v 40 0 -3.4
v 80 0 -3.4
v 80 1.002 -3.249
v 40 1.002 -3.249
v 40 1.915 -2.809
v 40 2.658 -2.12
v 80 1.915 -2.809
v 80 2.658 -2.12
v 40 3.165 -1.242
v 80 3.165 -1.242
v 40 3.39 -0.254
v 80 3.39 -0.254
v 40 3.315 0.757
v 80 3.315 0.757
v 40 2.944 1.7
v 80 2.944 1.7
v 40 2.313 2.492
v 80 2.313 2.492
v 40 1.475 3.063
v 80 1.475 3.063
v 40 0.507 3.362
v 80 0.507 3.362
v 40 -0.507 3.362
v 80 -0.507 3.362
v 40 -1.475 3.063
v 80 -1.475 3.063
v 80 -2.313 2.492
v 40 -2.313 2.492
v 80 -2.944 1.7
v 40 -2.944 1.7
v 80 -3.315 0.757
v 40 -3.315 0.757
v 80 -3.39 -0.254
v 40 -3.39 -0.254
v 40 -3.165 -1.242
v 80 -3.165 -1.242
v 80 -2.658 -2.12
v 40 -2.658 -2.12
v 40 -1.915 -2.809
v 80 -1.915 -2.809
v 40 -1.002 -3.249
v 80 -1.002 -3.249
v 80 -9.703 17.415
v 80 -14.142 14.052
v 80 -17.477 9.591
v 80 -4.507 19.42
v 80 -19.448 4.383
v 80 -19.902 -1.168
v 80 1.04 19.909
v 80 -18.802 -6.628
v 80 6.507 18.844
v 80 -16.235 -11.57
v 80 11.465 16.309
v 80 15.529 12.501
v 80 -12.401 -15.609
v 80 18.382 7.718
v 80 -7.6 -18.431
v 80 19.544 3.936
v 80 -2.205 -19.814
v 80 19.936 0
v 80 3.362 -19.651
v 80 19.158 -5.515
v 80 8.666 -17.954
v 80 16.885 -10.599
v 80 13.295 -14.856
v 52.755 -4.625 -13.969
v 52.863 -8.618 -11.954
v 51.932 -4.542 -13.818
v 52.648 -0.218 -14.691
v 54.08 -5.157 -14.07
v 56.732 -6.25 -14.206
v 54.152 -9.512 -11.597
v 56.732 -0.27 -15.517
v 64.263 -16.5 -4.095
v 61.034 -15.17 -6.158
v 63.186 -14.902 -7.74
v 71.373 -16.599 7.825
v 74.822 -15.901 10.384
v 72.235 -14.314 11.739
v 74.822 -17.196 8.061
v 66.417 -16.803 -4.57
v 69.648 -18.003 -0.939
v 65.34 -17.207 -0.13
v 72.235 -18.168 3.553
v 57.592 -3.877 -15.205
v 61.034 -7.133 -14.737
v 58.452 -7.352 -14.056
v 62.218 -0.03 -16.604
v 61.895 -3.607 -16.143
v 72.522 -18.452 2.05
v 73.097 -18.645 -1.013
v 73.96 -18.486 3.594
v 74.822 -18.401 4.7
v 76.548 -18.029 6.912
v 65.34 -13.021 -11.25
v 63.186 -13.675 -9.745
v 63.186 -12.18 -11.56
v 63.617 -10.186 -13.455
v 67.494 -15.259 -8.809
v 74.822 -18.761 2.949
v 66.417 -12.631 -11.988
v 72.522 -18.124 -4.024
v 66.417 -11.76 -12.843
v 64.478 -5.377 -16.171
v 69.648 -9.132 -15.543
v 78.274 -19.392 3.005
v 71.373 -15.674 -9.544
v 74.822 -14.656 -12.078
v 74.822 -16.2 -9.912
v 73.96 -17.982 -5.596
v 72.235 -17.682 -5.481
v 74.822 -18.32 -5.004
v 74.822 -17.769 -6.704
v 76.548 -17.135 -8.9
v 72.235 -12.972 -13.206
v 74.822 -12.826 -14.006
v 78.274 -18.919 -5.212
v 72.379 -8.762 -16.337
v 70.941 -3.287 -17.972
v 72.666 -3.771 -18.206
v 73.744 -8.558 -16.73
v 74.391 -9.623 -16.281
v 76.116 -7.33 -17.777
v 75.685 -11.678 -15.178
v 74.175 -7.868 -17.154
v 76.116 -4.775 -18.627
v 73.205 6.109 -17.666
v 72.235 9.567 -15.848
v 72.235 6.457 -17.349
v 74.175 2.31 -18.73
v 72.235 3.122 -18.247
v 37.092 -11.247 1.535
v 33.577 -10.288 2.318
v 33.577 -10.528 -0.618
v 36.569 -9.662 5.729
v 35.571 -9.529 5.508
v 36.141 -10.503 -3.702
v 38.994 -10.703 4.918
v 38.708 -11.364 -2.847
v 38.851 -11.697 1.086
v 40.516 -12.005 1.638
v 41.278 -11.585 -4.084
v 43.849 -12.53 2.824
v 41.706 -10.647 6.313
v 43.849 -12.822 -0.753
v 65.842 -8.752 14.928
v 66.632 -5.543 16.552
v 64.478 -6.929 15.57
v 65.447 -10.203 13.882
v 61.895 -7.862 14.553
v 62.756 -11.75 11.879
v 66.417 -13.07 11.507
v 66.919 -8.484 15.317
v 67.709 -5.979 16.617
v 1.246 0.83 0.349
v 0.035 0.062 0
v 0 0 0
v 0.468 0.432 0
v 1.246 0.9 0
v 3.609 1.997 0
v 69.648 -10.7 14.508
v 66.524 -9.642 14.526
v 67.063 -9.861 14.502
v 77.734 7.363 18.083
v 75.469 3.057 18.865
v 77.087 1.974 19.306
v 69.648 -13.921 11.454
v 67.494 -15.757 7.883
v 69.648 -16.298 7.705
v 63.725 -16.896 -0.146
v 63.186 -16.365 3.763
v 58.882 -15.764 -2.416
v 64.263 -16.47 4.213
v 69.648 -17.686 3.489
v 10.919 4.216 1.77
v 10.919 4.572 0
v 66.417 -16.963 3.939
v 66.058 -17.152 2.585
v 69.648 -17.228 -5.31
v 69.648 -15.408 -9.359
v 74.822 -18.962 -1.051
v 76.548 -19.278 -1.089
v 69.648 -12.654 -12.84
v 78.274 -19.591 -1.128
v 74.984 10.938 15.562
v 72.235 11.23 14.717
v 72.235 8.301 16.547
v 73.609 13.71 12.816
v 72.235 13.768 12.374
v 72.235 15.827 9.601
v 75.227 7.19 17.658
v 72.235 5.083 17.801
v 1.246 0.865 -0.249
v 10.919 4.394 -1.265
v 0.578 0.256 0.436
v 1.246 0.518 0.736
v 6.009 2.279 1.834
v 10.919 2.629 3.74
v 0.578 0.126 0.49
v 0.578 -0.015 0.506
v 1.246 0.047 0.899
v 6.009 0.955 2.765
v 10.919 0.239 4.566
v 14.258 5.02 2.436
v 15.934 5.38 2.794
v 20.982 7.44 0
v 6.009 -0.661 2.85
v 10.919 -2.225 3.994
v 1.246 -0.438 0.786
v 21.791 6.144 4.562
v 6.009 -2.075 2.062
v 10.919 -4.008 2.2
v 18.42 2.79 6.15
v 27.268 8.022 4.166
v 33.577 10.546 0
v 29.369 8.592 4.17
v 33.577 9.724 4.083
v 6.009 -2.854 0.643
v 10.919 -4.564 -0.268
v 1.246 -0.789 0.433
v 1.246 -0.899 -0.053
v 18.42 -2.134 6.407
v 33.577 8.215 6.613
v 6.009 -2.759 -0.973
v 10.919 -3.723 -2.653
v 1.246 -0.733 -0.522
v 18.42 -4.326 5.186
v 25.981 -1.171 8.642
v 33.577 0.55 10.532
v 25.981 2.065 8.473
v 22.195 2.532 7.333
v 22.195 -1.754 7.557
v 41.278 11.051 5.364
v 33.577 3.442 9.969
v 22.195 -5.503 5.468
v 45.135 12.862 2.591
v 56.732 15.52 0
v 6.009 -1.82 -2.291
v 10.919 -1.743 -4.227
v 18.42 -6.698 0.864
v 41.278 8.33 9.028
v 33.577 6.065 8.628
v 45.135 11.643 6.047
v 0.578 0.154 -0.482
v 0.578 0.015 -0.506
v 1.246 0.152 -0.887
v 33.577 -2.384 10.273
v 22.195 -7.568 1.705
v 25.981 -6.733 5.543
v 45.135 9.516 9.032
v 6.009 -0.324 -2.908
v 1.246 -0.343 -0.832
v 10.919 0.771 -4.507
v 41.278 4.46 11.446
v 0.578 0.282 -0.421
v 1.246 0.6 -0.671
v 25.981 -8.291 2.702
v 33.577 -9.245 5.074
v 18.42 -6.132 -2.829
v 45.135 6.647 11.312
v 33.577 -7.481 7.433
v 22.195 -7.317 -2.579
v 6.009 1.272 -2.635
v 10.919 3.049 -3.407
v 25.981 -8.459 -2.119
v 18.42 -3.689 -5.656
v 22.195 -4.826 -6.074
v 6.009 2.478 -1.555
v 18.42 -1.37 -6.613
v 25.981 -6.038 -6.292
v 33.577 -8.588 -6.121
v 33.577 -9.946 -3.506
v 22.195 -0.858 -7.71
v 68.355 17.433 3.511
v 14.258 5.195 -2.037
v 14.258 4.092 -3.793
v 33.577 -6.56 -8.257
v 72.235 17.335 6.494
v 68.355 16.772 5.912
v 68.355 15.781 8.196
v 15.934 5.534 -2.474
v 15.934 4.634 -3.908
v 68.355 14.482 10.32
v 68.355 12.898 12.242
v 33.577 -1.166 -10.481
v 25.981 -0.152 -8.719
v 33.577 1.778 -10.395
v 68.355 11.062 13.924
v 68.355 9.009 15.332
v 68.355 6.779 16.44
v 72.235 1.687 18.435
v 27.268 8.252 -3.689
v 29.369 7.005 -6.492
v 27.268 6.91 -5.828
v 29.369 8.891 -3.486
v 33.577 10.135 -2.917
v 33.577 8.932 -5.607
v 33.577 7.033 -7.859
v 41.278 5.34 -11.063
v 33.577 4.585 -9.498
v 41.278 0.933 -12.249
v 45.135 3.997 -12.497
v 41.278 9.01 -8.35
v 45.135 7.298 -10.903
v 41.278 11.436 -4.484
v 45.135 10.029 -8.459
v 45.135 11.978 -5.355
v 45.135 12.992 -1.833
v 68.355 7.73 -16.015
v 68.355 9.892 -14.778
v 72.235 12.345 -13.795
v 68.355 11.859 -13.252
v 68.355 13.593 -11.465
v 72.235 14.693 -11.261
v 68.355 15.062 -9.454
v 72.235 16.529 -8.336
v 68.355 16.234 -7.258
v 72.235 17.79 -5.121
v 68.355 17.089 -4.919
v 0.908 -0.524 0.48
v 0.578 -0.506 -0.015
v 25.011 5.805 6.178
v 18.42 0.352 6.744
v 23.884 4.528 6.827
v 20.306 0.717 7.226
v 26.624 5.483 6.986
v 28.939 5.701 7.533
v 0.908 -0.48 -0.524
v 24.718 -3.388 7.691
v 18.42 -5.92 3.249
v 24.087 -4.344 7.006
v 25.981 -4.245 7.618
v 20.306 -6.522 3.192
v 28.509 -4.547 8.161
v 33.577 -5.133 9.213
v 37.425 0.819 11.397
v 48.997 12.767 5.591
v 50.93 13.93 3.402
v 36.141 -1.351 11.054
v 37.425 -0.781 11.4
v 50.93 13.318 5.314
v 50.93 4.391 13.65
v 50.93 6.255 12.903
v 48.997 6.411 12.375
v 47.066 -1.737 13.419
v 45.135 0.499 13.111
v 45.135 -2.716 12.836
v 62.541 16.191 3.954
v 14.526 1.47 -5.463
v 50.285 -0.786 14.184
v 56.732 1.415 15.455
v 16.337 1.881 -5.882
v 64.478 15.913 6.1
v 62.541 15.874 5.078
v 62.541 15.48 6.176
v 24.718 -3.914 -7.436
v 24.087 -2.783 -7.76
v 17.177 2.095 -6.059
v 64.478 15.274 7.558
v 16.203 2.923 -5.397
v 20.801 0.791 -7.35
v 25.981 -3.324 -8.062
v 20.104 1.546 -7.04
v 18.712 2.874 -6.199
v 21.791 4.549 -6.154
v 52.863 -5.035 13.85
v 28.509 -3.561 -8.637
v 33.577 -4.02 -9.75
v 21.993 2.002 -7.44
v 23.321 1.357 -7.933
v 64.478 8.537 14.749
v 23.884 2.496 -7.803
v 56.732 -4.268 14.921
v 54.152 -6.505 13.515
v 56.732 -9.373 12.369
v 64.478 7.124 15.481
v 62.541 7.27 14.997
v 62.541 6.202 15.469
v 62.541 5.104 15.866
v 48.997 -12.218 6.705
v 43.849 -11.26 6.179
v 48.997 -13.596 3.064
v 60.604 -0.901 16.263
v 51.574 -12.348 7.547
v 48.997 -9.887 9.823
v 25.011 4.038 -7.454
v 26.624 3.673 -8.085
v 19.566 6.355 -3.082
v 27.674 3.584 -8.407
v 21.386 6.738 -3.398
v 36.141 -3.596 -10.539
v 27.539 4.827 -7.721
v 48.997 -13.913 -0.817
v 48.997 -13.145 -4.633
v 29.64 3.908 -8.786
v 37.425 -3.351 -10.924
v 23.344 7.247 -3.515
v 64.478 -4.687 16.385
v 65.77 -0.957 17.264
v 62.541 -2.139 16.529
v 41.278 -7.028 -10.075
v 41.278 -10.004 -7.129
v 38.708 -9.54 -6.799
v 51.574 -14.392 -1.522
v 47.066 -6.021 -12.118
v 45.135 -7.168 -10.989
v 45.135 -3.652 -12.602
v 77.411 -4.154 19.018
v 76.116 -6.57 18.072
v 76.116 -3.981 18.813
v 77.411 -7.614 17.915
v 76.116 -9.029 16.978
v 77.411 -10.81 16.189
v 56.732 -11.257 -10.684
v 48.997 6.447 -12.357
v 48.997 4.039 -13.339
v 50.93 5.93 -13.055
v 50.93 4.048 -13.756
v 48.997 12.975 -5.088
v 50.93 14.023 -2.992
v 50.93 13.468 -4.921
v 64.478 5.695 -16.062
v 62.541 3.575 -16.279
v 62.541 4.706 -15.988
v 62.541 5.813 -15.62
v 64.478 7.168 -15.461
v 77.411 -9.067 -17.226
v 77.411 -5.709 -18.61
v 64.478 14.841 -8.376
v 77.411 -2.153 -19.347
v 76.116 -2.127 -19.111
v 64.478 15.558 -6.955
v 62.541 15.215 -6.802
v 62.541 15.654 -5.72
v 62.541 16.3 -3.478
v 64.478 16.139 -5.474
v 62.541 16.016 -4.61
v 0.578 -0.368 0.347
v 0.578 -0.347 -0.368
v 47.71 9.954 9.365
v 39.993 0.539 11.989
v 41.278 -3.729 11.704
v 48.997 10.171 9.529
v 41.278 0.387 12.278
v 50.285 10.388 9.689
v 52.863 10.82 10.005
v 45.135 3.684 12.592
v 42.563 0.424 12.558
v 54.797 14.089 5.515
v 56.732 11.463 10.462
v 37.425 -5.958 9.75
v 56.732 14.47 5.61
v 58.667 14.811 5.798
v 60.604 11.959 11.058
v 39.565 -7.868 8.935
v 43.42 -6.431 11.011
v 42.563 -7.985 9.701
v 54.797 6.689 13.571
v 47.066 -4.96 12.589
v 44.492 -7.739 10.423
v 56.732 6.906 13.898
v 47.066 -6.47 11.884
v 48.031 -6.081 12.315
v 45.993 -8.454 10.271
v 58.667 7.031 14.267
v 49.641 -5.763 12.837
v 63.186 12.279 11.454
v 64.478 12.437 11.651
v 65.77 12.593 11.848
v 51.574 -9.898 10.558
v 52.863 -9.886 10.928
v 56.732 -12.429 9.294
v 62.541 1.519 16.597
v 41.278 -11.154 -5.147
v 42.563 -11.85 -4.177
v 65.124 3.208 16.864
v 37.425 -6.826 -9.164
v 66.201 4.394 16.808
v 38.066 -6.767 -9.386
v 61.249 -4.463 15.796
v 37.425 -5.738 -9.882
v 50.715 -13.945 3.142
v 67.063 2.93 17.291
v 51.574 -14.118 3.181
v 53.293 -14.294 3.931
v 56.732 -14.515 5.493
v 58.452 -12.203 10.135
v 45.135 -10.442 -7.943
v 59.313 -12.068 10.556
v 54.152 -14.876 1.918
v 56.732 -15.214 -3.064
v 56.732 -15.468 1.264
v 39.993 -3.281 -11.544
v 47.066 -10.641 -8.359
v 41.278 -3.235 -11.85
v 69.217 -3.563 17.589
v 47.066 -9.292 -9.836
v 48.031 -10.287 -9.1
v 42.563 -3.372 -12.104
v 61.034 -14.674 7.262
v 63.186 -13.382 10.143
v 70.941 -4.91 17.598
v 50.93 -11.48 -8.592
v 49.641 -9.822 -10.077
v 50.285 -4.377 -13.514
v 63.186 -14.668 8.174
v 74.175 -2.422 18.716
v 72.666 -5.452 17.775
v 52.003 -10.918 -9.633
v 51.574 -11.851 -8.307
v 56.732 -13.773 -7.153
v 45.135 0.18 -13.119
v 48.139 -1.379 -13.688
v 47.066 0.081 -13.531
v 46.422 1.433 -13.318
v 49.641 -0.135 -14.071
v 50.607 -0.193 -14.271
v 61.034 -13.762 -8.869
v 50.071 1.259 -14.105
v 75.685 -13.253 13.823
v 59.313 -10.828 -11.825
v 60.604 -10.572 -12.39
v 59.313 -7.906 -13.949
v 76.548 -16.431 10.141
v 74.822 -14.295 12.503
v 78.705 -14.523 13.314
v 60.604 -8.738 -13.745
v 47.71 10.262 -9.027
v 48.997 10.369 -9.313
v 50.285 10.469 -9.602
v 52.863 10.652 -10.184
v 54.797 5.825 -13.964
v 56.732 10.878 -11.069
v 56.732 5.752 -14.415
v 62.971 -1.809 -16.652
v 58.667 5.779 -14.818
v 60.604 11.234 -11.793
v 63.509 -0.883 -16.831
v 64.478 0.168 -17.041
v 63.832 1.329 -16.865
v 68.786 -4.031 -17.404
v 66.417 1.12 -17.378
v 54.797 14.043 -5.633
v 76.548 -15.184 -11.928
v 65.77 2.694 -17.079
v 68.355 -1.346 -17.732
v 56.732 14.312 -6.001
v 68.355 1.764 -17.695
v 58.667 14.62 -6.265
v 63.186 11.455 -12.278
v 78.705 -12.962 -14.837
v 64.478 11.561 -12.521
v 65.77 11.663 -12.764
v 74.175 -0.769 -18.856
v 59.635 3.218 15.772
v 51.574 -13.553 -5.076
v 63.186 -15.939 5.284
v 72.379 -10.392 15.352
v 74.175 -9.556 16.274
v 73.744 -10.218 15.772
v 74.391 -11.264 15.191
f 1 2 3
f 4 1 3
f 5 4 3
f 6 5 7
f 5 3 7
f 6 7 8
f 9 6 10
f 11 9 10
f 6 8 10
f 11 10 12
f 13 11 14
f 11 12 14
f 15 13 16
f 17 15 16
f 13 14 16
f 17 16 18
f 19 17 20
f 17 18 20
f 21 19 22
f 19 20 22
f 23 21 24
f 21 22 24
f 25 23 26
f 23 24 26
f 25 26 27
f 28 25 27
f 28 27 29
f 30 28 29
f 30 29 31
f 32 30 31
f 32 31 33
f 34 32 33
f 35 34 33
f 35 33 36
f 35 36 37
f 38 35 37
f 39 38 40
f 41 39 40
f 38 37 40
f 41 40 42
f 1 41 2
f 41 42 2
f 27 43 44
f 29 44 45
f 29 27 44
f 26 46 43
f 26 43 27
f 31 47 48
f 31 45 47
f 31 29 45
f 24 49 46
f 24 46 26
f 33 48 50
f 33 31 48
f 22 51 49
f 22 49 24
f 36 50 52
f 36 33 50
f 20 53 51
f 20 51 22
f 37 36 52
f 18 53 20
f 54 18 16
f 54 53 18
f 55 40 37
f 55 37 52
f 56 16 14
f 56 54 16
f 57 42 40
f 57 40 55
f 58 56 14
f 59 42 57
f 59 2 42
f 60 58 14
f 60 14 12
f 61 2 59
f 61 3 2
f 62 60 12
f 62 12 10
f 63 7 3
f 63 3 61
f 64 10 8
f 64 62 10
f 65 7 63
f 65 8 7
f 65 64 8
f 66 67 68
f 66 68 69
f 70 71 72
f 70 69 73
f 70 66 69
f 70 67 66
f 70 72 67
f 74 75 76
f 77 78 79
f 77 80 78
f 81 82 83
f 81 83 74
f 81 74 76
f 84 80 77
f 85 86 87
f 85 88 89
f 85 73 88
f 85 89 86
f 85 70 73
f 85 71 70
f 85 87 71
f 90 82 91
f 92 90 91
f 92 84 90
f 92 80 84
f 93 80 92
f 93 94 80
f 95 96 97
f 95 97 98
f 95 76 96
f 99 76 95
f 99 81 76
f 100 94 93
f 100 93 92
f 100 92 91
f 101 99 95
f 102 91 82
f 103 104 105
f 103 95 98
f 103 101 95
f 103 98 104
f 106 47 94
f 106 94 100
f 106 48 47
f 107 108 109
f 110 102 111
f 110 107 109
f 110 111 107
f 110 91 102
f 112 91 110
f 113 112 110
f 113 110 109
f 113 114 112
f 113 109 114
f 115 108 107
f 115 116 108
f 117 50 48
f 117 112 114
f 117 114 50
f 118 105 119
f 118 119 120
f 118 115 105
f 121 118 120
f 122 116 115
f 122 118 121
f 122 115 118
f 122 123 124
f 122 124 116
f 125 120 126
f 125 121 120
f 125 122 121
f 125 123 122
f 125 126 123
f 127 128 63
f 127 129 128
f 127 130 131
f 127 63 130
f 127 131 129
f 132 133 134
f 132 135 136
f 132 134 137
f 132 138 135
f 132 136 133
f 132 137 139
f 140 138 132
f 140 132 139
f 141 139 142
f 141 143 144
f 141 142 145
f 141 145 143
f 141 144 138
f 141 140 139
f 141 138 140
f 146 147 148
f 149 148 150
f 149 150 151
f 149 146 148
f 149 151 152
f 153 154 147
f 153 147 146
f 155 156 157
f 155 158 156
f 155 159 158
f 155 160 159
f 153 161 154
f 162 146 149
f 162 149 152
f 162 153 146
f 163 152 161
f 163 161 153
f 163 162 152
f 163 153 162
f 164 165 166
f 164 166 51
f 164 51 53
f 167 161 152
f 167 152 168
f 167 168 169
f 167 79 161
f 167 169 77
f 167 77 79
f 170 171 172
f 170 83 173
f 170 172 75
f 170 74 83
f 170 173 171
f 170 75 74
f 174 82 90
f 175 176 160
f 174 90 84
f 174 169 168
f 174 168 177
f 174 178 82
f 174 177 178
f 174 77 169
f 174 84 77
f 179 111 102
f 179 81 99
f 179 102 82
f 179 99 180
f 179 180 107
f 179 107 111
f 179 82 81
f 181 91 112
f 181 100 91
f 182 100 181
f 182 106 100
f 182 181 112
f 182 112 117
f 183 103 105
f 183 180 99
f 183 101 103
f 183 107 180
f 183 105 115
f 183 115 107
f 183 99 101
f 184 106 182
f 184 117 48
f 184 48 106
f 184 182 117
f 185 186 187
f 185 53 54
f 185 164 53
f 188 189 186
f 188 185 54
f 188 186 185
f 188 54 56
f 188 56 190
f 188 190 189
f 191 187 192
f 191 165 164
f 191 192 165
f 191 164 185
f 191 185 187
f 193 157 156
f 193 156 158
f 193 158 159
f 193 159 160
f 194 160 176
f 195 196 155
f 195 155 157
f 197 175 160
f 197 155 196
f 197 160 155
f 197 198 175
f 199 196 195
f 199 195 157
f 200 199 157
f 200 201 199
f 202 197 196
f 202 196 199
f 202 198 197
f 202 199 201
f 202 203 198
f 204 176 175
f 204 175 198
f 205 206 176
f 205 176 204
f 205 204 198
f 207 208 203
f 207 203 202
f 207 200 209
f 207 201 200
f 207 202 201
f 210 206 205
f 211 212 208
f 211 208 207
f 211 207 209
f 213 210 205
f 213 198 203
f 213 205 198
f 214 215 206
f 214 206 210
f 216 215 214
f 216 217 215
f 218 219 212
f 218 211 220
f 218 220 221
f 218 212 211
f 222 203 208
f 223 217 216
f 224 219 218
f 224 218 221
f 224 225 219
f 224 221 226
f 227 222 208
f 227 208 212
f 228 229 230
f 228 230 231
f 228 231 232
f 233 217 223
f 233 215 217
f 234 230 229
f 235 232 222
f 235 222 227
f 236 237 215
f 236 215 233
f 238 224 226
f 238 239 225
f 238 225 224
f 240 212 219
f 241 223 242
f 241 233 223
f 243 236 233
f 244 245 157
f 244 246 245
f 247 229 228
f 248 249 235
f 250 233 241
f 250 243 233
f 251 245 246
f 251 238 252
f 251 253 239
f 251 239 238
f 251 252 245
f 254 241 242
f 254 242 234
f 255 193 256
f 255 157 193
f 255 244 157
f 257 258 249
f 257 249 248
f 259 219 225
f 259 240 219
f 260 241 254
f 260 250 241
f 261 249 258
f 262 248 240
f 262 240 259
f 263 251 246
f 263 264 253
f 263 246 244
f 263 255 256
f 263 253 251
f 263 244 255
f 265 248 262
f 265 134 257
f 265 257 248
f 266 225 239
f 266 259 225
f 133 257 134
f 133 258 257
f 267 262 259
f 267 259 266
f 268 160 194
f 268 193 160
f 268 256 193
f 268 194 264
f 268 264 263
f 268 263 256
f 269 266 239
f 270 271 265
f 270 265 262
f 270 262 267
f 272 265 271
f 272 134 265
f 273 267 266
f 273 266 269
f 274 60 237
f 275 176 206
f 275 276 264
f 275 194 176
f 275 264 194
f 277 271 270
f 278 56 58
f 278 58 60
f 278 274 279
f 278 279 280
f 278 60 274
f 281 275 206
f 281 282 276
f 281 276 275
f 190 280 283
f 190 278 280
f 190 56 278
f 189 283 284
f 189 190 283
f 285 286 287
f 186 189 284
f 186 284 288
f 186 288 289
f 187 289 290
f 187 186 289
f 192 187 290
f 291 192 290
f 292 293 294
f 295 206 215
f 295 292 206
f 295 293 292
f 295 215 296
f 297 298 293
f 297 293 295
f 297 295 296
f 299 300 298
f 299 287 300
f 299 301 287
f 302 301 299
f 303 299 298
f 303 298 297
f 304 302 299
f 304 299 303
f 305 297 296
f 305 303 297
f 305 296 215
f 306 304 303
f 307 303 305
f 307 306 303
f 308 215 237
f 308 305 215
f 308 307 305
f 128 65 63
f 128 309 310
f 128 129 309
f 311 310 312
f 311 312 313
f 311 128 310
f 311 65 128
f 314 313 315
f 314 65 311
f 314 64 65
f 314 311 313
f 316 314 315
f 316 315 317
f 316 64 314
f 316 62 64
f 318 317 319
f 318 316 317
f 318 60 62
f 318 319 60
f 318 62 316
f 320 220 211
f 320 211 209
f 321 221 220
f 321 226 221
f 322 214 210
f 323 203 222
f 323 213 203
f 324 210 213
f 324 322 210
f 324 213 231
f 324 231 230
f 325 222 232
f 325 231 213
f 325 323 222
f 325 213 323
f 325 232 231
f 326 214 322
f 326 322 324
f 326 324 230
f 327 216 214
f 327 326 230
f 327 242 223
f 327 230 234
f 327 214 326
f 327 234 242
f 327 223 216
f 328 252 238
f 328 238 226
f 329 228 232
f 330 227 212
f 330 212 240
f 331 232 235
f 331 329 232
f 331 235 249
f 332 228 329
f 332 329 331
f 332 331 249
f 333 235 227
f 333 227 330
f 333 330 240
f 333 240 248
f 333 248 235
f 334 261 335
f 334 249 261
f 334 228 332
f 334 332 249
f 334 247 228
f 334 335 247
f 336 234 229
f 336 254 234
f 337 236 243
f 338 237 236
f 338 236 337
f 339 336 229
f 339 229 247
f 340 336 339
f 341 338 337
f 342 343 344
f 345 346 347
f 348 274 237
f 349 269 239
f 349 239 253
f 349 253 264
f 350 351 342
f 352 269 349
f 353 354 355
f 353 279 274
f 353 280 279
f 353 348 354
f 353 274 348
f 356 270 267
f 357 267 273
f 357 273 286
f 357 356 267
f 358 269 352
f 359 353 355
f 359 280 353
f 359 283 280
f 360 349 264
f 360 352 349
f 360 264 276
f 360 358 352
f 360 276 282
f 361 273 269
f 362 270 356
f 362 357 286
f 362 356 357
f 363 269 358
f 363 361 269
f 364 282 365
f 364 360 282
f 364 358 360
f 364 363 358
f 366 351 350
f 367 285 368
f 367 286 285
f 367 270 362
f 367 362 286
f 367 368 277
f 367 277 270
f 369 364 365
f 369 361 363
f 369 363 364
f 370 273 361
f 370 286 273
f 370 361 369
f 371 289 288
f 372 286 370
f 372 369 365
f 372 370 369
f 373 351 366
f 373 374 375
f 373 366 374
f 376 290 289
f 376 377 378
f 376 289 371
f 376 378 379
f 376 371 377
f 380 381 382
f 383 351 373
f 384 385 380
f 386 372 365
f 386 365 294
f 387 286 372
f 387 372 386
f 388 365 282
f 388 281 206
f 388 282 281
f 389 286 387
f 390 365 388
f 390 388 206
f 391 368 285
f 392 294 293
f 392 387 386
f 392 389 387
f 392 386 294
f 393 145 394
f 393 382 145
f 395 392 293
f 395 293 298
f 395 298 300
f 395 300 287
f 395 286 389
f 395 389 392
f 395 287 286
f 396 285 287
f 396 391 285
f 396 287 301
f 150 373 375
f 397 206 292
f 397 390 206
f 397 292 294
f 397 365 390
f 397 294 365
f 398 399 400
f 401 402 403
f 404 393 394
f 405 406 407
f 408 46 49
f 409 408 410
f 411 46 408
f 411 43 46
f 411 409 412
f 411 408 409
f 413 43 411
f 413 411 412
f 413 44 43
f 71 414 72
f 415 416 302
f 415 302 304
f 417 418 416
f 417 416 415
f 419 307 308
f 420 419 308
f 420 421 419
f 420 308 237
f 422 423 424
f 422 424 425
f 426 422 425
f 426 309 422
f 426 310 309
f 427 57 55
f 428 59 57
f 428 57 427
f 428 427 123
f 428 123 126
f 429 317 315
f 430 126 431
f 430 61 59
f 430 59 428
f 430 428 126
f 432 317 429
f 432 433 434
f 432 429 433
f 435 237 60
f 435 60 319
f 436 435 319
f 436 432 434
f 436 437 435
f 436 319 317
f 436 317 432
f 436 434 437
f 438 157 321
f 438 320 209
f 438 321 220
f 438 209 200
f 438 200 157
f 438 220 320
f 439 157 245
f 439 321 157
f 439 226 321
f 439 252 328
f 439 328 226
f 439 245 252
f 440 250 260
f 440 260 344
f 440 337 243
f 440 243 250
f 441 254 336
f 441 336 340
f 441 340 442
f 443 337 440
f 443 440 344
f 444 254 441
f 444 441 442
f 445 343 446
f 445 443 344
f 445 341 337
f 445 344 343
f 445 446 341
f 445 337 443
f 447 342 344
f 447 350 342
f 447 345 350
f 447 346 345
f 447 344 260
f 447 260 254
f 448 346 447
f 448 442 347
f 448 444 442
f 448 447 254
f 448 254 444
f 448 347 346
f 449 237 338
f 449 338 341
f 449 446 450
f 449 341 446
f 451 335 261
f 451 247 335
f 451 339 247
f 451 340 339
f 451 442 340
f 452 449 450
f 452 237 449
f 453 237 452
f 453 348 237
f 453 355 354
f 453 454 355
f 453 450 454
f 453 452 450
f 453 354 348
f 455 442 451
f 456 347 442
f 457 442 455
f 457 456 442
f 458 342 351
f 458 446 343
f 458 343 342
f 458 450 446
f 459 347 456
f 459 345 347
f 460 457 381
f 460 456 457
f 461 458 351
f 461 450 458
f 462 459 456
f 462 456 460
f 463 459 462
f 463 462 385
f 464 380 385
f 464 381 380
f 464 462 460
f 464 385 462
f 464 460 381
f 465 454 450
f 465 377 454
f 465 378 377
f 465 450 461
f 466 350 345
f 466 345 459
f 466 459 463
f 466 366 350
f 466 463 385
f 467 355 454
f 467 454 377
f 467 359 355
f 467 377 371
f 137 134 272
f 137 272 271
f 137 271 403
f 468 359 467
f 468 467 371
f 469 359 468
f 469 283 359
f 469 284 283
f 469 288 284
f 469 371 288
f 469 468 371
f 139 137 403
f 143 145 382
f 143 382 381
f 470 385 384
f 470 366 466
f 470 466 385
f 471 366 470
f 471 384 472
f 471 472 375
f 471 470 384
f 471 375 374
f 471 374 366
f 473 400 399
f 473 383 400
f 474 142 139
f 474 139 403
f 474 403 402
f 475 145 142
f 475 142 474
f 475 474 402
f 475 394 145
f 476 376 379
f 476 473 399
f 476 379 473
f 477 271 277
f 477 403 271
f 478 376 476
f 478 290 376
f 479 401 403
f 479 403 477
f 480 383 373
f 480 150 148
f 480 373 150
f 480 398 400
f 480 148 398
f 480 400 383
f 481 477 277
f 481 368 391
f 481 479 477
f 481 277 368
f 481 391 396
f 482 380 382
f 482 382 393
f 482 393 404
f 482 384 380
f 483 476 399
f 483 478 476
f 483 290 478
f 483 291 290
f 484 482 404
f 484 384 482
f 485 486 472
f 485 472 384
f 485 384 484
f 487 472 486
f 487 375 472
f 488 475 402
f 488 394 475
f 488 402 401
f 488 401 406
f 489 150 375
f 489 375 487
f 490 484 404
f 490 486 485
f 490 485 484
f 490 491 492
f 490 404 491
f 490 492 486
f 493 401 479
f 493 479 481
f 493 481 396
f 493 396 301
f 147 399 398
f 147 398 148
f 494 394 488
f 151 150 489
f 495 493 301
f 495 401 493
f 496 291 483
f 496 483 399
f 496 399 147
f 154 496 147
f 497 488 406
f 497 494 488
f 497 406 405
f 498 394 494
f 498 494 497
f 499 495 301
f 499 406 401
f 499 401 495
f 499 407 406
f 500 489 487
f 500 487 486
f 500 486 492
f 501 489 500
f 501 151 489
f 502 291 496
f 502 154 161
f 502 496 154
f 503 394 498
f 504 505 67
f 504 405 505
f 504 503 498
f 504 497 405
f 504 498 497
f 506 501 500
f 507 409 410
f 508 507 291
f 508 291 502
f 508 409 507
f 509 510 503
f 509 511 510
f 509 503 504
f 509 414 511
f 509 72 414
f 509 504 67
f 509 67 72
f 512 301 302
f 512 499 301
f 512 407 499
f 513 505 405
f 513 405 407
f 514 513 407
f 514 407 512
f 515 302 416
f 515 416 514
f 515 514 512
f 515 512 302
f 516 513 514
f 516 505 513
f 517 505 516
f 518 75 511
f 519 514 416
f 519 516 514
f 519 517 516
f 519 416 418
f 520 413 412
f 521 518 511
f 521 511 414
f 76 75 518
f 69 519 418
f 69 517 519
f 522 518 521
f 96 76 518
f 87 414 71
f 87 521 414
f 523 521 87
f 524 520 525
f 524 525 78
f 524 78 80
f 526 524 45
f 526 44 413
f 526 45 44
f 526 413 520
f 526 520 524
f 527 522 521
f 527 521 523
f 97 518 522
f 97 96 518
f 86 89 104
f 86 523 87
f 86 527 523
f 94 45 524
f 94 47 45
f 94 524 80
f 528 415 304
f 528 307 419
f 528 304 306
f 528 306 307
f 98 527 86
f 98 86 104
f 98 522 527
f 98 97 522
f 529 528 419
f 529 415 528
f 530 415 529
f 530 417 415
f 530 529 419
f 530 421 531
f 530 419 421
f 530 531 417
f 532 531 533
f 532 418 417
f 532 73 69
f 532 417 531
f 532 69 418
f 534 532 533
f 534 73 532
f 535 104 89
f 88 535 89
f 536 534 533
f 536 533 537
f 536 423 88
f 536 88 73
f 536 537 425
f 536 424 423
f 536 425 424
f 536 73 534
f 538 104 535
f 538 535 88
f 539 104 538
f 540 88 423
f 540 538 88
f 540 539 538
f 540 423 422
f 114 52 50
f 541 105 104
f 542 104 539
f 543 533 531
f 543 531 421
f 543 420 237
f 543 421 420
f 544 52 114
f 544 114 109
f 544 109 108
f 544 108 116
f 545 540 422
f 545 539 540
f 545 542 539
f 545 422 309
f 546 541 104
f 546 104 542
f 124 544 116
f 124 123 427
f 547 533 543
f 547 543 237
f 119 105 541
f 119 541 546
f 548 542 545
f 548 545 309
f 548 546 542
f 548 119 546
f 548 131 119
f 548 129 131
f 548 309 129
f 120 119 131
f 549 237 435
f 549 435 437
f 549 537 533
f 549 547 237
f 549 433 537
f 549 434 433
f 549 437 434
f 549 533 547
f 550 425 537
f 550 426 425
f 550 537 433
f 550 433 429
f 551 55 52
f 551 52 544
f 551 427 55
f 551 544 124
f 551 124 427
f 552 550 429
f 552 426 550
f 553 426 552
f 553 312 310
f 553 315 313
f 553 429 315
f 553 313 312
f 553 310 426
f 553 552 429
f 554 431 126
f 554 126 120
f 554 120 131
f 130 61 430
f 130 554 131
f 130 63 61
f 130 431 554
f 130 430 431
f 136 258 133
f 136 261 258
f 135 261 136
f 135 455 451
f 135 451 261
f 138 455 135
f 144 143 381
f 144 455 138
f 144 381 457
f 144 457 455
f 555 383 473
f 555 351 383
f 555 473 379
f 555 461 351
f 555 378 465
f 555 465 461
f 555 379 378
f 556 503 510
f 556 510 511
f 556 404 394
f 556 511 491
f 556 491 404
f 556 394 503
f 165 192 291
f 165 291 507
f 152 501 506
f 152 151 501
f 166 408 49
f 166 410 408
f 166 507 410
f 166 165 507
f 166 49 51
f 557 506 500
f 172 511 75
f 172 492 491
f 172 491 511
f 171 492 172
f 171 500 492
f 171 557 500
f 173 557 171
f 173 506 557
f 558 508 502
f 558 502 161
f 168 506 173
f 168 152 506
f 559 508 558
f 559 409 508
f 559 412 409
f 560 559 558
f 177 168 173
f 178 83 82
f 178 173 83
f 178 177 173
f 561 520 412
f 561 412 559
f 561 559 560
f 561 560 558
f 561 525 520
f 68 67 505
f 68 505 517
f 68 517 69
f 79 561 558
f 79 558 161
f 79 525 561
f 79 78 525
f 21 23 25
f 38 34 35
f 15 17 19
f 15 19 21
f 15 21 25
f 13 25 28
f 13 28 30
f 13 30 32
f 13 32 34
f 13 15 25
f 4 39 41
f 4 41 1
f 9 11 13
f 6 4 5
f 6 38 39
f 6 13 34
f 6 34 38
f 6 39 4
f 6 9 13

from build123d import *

# Parameters (mm, degrees)
SKETCH2_R          = 3.4
CUT_EXTRUDE1_DEPTH = 40


with BuildPart() as part:
    # Sketch1 → nosecone (revolve)
    with BuildSketch(Plane.XY):
        with BuildLine():
            Line((522, 64), (522, 0))
            Line((522, 0), (0, 0))
            add(Edge.make_bspline(
                [(0, 0), (0.001826953, 0.006816181), (0.006771486, 0.019936491), (0.021506417, 0.044166263), (0.046661717, 0.077995323), (0.079258284, 0.115021795), (0.126589165, 0.1631126), (0.184725886, 0.216219225), (0.25368033, 0.273933256), (0.3336007, 0.335900322), (0.460446691, 0.428551795), (0.660423817, 0.56263485), (0.982994634, 0.758855246), (1.534590027, 1.060170132), (2.465111939, 1.514644597), (4.12322816, 2.230092141), (7.193139768, 3.388122977), (12.880029643, 5.240285309), (22.608227584, 7.961769734), (39.482108423, 12.034562333), (62.843954379, 16.872422149), (91.388928515, 22.077714797), (123.506939437, 27.314789053), (155.694792914, 32.098908935), (187.936268488, 36.506706047), (220.220524829, 40.587704184), (252.541063501, 44.370523086), (284.893049861, 47.873353173), (313.225812895, 50.70042069), (337.527208669, 52.954297833), (357.78867383, 54.717201133), (374.003843123, 56.056867076), (390.224875338, 57.323634808), (406.451649281, 58.514543694), (422.684094329, 59.625536005), (436.892399391, 60.523006492), (449.074445036, 61.234348916), (459.228488268, 61.785275673), (467.353134193, 62.199305564), (474.463438705, 62.536502787), (480.558876848, 62.806052202), (485.639004312, 63.016686188), (489.703465178, 63.176292335), (496.025715941, 63.409883926), (502.151121166, 63.609445791), (508.079596574, 63.773693753), (513.811063557, 63.896378115), (516.677010914, 63.946393952), (519.133691426, 63.980267001), (520.77156104, 63.994268893), (521.590516942, 64), (522, 64)],
                knots=[0, 0, 0, 0, 0, 5.3359e-05, 0.000106717, 0.000213435, 0.000320152, 0.000426869, 0.000618636, 0.000810403, 0.001002169, 0.001193936, 0.001810104, 0.002636369, 0.003865352, 0.005960687, 0.009663494, 0.016331671, 0.028747863, 0.051319548, 0.086278578, 0.147994086, 0.209709638, 0.271425063, 0.333140753, 0.394856375, 0.456571956, 0.518287567, 0.580003173, 0.641718727, 0.672576571, 0.703434416, 0.734292234, 0.765150051, 0.79600786, 0.826865668, 0.857723431, 0.873152313, 0.888581195, 0.904010107, 0.919439018, 0.927153474, 0.93486793, 0.942582386, 0.950296842, 0.975148421, 0.981361316, 0.98757421, 0.993787105, 0.996893553, 1, 1, 1, 1, 1], degree=4))
        make_face()
    revolve(axis=Axis((-5.186257975, 0, 0), (1, 0, 0)))

    # SurfaceCut1
    split(bisect_by=Plane(origin=(80, 0, 0), x_dir=(0, 0, -1), z_dir=(1, 0, 0)), keep=Keep.BOTTOM)

    # Sketch2 → Cut-Extrude1 (cut)
    with BuildSketch(Plane(origin=(80, 0, 0), x_dir=(0, 0, -1), z_dir=(1, 0, 0))):
        Circle(SKETCH2_R)
    extrude(amount=-CUT_EXTRUDE1_DEPTH, mode=Mode.SUBTRACT)


solid = part.part
